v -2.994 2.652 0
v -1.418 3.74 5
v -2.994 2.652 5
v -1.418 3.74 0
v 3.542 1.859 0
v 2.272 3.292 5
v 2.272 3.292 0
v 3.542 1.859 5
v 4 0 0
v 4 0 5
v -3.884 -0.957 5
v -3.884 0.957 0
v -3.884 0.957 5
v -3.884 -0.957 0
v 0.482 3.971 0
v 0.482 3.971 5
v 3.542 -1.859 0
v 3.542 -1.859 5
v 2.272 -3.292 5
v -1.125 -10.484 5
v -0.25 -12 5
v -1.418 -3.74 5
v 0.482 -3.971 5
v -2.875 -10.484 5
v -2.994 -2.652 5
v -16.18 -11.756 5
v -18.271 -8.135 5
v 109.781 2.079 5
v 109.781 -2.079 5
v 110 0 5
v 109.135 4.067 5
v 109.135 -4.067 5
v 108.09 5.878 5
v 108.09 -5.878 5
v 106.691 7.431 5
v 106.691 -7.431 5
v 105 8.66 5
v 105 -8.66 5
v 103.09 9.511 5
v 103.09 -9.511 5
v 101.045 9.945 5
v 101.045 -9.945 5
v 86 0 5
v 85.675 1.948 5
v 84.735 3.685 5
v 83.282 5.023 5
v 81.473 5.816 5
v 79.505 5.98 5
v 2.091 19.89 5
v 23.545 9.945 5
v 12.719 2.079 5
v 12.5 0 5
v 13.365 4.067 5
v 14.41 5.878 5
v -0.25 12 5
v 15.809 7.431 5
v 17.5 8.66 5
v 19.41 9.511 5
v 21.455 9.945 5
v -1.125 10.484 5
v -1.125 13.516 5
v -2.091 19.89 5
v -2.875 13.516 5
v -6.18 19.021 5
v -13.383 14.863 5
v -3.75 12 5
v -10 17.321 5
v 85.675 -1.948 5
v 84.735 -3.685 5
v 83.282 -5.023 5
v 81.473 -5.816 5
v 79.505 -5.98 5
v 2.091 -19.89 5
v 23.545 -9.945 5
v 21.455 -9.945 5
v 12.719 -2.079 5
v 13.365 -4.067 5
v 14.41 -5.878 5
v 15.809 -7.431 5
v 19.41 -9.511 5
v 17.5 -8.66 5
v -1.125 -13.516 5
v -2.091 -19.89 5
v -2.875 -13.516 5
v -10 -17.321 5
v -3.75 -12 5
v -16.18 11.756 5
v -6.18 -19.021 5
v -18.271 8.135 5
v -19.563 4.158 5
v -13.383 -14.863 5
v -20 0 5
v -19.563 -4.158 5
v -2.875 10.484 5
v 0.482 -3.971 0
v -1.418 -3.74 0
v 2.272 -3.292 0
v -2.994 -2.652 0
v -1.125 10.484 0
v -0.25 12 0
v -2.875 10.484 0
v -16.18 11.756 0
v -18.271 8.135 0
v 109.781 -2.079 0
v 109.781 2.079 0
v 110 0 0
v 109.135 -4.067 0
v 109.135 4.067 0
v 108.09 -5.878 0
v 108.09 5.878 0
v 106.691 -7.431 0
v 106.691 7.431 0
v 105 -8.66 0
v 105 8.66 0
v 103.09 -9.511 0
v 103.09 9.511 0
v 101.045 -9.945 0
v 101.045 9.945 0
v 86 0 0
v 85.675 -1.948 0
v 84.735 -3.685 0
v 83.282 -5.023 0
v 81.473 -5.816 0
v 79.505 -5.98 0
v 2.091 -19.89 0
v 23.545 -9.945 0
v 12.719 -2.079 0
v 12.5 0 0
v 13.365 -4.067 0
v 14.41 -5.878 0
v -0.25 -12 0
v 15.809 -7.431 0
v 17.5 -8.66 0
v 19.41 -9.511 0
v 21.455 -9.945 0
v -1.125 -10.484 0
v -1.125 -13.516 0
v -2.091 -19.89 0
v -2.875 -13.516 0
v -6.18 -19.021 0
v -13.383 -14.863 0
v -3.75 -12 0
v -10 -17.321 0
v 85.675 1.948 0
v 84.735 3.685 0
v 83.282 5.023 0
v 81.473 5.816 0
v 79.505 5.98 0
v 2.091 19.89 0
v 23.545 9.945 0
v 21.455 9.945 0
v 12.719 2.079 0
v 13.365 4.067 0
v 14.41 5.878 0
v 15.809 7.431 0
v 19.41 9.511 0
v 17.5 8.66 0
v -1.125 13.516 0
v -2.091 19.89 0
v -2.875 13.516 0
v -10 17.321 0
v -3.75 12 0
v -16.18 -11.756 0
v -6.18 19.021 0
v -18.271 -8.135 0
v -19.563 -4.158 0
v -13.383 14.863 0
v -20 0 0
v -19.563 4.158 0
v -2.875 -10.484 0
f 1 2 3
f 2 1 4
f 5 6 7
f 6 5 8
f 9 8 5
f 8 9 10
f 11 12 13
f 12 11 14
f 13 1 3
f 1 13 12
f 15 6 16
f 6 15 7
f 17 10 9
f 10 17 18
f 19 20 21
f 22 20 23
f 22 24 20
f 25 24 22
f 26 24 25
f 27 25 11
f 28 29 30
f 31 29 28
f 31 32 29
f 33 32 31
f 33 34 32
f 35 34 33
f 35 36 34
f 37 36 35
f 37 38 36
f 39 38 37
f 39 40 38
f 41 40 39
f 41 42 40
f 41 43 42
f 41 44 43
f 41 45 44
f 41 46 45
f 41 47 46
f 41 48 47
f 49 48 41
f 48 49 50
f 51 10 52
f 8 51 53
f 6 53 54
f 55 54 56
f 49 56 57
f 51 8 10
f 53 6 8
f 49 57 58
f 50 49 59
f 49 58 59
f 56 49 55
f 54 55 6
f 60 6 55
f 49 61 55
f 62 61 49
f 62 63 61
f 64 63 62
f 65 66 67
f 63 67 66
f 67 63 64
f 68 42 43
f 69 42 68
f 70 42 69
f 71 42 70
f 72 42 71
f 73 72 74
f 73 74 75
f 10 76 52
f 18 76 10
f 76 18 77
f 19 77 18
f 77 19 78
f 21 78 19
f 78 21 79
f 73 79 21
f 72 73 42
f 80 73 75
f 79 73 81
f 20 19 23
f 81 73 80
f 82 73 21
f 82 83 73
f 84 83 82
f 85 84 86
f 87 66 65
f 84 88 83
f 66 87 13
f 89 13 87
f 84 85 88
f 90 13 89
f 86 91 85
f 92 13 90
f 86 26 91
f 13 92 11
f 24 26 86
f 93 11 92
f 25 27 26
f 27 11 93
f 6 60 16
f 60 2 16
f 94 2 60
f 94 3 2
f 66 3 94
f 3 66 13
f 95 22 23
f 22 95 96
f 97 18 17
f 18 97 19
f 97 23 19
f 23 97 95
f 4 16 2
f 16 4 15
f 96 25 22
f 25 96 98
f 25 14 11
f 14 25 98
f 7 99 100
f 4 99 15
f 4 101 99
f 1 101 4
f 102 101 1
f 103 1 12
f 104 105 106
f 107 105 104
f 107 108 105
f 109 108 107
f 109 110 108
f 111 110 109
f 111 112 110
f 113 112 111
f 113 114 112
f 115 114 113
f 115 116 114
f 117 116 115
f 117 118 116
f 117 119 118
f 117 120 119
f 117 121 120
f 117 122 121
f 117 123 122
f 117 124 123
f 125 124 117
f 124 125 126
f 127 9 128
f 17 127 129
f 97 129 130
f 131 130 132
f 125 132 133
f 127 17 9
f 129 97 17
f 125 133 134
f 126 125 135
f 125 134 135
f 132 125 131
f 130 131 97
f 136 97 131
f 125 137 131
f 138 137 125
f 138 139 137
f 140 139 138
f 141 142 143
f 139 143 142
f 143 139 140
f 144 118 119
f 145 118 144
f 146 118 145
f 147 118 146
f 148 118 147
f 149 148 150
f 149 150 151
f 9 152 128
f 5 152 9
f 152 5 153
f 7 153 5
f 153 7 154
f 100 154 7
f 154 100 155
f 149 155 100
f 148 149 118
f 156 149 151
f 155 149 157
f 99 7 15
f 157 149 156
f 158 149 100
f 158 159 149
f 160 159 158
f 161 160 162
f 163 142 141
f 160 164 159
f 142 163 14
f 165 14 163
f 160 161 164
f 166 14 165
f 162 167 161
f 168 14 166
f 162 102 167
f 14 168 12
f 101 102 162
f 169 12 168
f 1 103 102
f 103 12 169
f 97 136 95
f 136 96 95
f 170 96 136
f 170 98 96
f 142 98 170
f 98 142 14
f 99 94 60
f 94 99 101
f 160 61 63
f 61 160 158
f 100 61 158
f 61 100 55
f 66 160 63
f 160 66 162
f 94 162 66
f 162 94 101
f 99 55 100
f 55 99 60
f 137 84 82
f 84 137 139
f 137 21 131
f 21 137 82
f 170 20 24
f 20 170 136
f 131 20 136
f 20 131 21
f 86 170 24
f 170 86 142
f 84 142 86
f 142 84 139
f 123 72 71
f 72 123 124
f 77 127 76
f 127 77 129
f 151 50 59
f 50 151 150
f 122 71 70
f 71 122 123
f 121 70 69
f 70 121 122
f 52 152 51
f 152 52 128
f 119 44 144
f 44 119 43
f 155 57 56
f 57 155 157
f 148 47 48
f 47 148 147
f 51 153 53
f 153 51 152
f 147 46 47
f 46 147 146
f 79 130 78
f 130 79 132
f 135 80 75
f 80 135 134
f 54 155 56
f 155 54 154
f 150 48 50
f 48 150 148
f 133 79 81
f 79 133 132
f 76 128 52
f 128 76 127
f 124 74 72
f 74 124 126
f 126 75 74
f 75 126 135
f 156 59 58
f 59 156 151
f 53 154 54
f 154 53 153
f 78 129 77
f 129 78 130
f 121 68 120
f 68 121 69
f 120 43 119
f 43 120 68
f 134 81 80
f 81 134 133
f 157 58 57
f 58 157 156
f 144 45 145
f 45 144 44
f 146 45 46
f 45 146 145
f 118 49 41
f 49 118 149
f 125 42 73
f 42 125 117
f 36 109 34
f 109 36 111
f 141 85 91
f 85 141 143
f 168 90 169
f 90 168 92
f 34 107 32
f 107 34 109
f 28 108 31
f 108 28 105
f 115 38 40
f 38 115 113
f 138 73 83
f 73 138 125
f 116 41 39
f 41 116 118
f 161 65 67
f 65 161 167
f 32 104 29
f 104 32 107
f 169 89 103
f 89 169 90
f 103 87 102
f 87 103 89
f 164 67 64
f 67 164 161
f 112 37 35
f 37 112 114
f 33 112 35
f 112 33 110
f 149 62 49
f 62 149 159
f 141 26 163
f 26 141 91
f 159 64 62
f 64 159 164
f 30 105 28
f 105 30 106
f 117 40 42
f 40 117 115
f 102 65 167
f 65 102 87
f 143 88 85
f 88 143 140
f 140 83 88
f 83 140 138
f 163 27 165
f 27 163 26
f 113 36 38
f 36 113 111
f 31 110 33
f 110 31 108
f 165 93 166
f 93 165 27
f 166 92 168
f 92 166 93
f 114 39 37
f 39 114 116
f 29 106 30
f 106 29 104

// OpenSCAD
// the arm mount hole pattern
module arm_mount(h) {
  cylinder(r=4, h=h);
  translate([-2, 12, 0]) cylinder(r=1.75, h=h);
  translate([-2, -12, 0]) cylinder(r=1.75, h=h);
};

module arm() {
  difference() {
    hull() {
      cylinder(r=20, h=5);
      translate([100, 0, 0]) cylinder(r=10, h=5);
    }
    union() {
      arm_mount(5);
      hull() {
        translate([22.5, 0, 0]) cylinder(r=10, h=5);
        translate([80, 0, 0]) cylinder(r=6, h=5);
      };
    };
  };
};

arm();
